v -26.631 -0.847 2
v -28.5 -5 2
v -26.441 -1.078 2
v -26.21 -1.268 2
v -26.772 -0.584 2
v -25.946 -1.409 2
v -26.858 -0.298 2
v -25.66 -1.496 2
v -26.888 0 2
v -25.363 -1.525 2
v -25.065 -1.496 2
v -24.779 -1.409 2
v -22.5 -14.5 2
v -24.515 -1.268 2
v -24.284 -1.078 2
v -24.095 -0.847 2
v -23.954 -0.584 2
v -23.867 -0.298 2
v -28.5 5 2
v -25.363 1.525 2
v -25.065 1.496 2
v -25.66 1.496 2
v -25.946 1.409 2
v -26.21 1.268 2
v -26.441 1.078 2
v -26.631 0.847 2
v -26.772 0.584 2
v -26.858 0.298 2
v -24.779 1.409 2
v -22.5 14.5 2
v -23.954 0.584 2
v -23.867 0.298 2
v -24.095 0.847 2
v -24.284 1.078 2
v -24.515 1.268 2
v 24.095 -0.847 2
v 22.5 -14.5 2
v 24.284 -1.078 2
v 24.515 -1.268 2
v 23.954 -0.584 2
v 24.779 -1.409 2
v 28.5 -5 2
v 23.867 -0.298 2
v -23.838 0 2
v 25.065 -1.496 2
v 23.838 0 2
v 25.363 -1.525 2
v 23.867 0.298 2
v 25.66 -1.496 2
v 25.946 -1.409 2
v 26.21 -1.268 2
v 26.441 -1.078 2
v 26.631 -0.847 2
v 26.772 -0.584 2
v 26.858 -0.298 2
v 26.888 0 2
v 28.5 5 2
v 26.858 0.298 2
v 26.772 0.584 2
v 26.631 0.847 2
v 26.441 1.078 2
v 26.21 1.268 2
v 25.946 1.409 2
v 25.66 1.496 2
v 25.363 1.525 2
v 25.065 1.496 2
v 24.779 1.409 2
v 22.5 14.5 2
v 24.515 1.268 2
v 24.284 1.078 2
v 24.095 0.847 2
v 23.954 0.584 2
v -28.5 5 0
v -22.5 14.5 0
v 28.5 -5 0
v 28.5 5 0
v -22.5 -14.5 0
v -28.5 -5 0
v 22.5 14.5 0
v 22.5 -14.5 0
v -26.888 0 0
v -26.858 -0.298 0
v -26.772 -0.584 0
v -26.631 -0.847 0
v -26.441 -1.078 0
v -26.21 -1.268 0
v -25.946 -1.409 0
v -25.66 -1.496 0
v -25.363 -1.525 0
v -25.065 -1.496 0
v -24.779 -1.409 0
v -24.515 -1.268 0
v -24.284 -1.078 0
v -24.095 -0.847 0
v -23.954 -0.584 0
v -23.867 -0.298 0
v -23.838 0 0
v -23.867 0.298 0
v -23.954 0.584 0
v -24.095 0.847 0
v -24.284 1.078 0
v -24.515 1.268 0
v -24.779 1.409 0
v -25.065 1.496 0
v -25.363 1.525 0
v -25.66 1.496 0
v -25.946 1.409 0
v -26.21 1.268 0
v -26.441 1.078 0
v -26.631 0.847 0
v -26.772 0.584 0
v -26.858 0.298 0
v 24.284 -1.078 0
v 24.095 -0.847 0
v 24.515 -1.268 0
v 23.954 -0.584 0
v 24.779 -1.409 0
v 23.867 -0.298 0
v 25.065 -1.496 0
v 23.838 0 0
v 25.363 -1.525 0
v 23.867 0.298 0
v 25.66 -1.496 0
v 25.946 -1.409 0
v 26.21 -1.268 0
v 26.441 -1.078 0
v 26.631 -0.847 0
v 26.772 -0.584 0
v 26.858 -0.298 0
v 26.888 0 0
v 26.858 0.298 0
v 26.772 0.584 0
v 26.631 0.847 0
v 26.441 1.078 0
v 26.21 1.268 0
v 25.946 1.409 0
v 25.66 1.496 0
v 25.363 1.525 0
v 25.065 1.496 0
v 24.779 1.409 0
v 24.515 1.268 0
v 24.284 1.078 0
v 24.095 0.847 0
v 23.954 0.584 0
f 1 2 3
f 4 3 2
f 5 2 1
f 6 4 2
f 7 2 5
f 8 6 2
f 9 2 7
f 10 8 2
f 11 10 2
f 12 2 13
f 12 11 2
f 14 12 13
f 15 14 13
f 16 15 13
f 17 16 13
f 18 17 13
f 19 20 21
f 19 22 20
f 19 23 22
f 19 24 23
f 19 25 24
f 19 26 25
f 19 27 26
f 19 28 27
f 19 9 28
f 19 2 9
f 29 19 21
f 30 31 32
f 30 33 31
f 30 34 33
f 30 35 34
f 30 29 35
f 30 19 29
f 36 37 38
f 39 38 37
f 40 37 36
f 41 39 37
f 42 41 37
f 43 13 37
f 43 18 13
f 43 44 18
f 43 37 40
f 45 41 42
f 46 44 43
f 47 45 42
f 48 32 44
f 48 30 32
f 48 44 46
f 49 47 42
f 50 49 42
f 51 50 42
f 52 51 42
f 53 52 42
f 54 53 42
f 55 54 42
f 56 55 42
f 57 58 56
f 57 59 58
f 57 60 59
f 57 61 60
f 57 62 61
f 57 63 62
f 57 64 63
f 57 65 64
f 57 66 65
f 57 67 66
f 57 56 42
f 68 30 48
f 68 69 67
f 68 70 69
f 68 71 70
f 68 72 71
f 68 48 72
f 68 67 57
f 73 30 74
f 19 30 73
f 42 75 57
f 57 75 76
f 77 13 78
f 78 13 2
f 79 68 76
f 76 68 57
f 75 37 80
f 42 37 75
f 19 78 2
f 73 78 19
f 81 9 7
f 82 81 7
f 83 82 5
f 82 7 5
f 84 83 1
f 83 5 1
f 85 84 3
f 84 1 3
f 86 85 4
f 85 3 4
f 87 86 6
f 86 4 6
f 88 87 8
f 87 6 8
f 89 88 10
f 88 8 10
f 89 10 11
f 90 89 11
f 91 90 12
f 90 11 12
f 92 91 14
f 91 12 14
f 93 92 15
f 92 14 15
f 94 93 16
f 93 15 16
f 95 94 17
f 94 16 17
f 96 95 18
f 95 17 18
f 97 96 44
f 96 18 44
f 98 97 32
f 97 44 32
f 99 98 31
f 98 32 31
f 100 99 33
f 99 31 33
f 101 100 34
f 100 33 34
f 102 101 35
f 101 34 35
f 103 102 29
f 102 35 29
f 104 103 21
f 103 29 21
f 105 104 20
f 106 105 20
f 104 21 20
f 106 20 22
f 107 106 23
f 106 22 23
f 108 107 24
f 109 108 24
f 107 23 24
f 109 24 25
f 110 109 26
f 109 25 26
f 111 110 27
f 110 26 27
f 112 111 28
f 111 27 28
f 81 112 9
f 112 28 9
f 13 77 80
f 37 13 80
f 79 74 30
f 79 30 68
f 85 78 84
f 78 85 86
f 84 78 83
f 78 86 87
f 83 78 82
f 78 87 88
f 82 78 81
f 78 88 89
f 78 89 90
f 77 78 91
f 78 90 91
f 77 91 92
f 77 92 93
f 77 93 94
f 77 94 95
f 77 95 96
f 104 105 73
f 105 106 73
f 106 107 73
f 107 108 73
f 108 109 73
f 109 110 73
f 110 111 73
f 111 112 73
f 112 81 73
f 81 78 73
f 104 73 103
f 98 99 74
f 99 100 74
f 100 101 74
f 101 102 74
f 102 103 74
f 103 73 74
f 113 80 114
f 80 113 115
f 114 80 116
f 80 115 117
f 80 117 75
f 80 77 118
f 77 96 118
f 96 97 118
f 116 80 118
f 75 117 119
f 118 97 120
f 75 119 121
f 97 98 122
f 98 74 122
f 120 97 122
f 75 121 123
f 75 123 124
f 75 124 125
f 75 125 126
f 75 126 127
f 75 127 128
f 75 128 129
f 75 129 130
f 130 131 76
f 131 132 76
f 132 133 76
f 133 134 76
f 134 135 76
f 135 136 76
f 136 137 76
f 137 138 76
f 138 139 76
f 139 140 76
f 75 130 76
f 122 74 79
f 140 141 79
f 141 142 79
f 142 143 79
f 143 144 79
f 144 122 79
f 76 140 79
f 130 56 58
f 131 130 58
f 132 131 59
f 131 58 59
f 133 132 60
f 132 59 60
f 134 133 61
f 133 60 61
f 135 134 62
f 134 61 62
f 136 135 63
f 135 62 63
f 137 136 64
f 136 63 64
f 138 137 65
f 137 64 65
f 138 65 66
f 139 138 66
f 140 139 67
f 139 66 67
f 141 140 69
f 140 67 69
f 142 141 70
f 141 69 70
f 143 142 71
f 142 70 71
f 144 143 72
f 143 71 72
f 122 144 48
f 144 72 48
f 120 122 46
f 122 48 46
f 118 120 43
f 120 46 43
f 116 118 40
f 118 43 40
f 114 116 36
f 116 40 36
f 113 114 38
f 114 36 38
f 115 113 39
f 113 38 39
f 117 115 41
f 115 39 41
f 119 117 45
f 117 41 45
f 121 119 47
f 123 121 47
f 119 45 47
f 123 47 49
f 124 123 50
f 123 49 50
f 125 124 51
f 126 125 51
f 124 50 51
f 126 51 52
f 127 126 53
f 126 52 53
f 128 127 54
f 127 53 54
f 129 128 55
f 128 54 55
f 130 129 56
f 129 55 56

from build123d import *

# Parameters (mm, degrees)
SKETCH_1_W          = 57
SKETCH_1_H          = 29
EXTRUDE_1_DEPTH     = 2
CUT_EXTRUDE_1_DEPTH = 2
SKETCH_3_R          = 1.525
CUT_EXTRUDE_2_DEPTH = 2


with BuildPart() as part:
    # 草图1 → 凸台-拉伸1 (new body)
    with BuildSketch(Plane.XY):
        Rectangle(SKETCH_1_W, SKETCH_1_H)
    extrude(amount=EXTRUDE_1_DEPTH)

    # 草图2 → 切除-拉伸1 (cut)
    with BuildSketch(Plane.XY.offset(2)):
        Polygon((22.5, 14.5), (28.5, 5), (28.5, 14.5), align=None)
        Polygon((28.5, -14.5), (22.5, -14.5), (28.5, -5), align=None)
    cut_extrude_1 = extrude(amount=-CUT_EXTRUDE_1_DEPTH, mode=Mode.SUBTRACT)

    # 镜向1: 切除-拉伸1 across plane
    add(cut_extrude_1.mirror(Plane(origin=(0, 0, 0), x_dir=(0, 0, 1), z_dir=(1, 0, 0))), mode=Mode.SUBTRACT)

    # 草图3 → 切除-拉伸2 (cut)
    with BuildSketch(Plane.XY.offset(2)):
        with Locations((25.362669783, 0)):
            Circle(SKETCH_3_R)
        with Locations(Location((-25.362669783, 0, 0), (0, 0, 180))):
            Circle(SKETCH_3_R)
    extrude(amount=-CUT_EXTRUDE_2_DEPTH, mode=Mode.SUBTRACT)


solid = part.part
